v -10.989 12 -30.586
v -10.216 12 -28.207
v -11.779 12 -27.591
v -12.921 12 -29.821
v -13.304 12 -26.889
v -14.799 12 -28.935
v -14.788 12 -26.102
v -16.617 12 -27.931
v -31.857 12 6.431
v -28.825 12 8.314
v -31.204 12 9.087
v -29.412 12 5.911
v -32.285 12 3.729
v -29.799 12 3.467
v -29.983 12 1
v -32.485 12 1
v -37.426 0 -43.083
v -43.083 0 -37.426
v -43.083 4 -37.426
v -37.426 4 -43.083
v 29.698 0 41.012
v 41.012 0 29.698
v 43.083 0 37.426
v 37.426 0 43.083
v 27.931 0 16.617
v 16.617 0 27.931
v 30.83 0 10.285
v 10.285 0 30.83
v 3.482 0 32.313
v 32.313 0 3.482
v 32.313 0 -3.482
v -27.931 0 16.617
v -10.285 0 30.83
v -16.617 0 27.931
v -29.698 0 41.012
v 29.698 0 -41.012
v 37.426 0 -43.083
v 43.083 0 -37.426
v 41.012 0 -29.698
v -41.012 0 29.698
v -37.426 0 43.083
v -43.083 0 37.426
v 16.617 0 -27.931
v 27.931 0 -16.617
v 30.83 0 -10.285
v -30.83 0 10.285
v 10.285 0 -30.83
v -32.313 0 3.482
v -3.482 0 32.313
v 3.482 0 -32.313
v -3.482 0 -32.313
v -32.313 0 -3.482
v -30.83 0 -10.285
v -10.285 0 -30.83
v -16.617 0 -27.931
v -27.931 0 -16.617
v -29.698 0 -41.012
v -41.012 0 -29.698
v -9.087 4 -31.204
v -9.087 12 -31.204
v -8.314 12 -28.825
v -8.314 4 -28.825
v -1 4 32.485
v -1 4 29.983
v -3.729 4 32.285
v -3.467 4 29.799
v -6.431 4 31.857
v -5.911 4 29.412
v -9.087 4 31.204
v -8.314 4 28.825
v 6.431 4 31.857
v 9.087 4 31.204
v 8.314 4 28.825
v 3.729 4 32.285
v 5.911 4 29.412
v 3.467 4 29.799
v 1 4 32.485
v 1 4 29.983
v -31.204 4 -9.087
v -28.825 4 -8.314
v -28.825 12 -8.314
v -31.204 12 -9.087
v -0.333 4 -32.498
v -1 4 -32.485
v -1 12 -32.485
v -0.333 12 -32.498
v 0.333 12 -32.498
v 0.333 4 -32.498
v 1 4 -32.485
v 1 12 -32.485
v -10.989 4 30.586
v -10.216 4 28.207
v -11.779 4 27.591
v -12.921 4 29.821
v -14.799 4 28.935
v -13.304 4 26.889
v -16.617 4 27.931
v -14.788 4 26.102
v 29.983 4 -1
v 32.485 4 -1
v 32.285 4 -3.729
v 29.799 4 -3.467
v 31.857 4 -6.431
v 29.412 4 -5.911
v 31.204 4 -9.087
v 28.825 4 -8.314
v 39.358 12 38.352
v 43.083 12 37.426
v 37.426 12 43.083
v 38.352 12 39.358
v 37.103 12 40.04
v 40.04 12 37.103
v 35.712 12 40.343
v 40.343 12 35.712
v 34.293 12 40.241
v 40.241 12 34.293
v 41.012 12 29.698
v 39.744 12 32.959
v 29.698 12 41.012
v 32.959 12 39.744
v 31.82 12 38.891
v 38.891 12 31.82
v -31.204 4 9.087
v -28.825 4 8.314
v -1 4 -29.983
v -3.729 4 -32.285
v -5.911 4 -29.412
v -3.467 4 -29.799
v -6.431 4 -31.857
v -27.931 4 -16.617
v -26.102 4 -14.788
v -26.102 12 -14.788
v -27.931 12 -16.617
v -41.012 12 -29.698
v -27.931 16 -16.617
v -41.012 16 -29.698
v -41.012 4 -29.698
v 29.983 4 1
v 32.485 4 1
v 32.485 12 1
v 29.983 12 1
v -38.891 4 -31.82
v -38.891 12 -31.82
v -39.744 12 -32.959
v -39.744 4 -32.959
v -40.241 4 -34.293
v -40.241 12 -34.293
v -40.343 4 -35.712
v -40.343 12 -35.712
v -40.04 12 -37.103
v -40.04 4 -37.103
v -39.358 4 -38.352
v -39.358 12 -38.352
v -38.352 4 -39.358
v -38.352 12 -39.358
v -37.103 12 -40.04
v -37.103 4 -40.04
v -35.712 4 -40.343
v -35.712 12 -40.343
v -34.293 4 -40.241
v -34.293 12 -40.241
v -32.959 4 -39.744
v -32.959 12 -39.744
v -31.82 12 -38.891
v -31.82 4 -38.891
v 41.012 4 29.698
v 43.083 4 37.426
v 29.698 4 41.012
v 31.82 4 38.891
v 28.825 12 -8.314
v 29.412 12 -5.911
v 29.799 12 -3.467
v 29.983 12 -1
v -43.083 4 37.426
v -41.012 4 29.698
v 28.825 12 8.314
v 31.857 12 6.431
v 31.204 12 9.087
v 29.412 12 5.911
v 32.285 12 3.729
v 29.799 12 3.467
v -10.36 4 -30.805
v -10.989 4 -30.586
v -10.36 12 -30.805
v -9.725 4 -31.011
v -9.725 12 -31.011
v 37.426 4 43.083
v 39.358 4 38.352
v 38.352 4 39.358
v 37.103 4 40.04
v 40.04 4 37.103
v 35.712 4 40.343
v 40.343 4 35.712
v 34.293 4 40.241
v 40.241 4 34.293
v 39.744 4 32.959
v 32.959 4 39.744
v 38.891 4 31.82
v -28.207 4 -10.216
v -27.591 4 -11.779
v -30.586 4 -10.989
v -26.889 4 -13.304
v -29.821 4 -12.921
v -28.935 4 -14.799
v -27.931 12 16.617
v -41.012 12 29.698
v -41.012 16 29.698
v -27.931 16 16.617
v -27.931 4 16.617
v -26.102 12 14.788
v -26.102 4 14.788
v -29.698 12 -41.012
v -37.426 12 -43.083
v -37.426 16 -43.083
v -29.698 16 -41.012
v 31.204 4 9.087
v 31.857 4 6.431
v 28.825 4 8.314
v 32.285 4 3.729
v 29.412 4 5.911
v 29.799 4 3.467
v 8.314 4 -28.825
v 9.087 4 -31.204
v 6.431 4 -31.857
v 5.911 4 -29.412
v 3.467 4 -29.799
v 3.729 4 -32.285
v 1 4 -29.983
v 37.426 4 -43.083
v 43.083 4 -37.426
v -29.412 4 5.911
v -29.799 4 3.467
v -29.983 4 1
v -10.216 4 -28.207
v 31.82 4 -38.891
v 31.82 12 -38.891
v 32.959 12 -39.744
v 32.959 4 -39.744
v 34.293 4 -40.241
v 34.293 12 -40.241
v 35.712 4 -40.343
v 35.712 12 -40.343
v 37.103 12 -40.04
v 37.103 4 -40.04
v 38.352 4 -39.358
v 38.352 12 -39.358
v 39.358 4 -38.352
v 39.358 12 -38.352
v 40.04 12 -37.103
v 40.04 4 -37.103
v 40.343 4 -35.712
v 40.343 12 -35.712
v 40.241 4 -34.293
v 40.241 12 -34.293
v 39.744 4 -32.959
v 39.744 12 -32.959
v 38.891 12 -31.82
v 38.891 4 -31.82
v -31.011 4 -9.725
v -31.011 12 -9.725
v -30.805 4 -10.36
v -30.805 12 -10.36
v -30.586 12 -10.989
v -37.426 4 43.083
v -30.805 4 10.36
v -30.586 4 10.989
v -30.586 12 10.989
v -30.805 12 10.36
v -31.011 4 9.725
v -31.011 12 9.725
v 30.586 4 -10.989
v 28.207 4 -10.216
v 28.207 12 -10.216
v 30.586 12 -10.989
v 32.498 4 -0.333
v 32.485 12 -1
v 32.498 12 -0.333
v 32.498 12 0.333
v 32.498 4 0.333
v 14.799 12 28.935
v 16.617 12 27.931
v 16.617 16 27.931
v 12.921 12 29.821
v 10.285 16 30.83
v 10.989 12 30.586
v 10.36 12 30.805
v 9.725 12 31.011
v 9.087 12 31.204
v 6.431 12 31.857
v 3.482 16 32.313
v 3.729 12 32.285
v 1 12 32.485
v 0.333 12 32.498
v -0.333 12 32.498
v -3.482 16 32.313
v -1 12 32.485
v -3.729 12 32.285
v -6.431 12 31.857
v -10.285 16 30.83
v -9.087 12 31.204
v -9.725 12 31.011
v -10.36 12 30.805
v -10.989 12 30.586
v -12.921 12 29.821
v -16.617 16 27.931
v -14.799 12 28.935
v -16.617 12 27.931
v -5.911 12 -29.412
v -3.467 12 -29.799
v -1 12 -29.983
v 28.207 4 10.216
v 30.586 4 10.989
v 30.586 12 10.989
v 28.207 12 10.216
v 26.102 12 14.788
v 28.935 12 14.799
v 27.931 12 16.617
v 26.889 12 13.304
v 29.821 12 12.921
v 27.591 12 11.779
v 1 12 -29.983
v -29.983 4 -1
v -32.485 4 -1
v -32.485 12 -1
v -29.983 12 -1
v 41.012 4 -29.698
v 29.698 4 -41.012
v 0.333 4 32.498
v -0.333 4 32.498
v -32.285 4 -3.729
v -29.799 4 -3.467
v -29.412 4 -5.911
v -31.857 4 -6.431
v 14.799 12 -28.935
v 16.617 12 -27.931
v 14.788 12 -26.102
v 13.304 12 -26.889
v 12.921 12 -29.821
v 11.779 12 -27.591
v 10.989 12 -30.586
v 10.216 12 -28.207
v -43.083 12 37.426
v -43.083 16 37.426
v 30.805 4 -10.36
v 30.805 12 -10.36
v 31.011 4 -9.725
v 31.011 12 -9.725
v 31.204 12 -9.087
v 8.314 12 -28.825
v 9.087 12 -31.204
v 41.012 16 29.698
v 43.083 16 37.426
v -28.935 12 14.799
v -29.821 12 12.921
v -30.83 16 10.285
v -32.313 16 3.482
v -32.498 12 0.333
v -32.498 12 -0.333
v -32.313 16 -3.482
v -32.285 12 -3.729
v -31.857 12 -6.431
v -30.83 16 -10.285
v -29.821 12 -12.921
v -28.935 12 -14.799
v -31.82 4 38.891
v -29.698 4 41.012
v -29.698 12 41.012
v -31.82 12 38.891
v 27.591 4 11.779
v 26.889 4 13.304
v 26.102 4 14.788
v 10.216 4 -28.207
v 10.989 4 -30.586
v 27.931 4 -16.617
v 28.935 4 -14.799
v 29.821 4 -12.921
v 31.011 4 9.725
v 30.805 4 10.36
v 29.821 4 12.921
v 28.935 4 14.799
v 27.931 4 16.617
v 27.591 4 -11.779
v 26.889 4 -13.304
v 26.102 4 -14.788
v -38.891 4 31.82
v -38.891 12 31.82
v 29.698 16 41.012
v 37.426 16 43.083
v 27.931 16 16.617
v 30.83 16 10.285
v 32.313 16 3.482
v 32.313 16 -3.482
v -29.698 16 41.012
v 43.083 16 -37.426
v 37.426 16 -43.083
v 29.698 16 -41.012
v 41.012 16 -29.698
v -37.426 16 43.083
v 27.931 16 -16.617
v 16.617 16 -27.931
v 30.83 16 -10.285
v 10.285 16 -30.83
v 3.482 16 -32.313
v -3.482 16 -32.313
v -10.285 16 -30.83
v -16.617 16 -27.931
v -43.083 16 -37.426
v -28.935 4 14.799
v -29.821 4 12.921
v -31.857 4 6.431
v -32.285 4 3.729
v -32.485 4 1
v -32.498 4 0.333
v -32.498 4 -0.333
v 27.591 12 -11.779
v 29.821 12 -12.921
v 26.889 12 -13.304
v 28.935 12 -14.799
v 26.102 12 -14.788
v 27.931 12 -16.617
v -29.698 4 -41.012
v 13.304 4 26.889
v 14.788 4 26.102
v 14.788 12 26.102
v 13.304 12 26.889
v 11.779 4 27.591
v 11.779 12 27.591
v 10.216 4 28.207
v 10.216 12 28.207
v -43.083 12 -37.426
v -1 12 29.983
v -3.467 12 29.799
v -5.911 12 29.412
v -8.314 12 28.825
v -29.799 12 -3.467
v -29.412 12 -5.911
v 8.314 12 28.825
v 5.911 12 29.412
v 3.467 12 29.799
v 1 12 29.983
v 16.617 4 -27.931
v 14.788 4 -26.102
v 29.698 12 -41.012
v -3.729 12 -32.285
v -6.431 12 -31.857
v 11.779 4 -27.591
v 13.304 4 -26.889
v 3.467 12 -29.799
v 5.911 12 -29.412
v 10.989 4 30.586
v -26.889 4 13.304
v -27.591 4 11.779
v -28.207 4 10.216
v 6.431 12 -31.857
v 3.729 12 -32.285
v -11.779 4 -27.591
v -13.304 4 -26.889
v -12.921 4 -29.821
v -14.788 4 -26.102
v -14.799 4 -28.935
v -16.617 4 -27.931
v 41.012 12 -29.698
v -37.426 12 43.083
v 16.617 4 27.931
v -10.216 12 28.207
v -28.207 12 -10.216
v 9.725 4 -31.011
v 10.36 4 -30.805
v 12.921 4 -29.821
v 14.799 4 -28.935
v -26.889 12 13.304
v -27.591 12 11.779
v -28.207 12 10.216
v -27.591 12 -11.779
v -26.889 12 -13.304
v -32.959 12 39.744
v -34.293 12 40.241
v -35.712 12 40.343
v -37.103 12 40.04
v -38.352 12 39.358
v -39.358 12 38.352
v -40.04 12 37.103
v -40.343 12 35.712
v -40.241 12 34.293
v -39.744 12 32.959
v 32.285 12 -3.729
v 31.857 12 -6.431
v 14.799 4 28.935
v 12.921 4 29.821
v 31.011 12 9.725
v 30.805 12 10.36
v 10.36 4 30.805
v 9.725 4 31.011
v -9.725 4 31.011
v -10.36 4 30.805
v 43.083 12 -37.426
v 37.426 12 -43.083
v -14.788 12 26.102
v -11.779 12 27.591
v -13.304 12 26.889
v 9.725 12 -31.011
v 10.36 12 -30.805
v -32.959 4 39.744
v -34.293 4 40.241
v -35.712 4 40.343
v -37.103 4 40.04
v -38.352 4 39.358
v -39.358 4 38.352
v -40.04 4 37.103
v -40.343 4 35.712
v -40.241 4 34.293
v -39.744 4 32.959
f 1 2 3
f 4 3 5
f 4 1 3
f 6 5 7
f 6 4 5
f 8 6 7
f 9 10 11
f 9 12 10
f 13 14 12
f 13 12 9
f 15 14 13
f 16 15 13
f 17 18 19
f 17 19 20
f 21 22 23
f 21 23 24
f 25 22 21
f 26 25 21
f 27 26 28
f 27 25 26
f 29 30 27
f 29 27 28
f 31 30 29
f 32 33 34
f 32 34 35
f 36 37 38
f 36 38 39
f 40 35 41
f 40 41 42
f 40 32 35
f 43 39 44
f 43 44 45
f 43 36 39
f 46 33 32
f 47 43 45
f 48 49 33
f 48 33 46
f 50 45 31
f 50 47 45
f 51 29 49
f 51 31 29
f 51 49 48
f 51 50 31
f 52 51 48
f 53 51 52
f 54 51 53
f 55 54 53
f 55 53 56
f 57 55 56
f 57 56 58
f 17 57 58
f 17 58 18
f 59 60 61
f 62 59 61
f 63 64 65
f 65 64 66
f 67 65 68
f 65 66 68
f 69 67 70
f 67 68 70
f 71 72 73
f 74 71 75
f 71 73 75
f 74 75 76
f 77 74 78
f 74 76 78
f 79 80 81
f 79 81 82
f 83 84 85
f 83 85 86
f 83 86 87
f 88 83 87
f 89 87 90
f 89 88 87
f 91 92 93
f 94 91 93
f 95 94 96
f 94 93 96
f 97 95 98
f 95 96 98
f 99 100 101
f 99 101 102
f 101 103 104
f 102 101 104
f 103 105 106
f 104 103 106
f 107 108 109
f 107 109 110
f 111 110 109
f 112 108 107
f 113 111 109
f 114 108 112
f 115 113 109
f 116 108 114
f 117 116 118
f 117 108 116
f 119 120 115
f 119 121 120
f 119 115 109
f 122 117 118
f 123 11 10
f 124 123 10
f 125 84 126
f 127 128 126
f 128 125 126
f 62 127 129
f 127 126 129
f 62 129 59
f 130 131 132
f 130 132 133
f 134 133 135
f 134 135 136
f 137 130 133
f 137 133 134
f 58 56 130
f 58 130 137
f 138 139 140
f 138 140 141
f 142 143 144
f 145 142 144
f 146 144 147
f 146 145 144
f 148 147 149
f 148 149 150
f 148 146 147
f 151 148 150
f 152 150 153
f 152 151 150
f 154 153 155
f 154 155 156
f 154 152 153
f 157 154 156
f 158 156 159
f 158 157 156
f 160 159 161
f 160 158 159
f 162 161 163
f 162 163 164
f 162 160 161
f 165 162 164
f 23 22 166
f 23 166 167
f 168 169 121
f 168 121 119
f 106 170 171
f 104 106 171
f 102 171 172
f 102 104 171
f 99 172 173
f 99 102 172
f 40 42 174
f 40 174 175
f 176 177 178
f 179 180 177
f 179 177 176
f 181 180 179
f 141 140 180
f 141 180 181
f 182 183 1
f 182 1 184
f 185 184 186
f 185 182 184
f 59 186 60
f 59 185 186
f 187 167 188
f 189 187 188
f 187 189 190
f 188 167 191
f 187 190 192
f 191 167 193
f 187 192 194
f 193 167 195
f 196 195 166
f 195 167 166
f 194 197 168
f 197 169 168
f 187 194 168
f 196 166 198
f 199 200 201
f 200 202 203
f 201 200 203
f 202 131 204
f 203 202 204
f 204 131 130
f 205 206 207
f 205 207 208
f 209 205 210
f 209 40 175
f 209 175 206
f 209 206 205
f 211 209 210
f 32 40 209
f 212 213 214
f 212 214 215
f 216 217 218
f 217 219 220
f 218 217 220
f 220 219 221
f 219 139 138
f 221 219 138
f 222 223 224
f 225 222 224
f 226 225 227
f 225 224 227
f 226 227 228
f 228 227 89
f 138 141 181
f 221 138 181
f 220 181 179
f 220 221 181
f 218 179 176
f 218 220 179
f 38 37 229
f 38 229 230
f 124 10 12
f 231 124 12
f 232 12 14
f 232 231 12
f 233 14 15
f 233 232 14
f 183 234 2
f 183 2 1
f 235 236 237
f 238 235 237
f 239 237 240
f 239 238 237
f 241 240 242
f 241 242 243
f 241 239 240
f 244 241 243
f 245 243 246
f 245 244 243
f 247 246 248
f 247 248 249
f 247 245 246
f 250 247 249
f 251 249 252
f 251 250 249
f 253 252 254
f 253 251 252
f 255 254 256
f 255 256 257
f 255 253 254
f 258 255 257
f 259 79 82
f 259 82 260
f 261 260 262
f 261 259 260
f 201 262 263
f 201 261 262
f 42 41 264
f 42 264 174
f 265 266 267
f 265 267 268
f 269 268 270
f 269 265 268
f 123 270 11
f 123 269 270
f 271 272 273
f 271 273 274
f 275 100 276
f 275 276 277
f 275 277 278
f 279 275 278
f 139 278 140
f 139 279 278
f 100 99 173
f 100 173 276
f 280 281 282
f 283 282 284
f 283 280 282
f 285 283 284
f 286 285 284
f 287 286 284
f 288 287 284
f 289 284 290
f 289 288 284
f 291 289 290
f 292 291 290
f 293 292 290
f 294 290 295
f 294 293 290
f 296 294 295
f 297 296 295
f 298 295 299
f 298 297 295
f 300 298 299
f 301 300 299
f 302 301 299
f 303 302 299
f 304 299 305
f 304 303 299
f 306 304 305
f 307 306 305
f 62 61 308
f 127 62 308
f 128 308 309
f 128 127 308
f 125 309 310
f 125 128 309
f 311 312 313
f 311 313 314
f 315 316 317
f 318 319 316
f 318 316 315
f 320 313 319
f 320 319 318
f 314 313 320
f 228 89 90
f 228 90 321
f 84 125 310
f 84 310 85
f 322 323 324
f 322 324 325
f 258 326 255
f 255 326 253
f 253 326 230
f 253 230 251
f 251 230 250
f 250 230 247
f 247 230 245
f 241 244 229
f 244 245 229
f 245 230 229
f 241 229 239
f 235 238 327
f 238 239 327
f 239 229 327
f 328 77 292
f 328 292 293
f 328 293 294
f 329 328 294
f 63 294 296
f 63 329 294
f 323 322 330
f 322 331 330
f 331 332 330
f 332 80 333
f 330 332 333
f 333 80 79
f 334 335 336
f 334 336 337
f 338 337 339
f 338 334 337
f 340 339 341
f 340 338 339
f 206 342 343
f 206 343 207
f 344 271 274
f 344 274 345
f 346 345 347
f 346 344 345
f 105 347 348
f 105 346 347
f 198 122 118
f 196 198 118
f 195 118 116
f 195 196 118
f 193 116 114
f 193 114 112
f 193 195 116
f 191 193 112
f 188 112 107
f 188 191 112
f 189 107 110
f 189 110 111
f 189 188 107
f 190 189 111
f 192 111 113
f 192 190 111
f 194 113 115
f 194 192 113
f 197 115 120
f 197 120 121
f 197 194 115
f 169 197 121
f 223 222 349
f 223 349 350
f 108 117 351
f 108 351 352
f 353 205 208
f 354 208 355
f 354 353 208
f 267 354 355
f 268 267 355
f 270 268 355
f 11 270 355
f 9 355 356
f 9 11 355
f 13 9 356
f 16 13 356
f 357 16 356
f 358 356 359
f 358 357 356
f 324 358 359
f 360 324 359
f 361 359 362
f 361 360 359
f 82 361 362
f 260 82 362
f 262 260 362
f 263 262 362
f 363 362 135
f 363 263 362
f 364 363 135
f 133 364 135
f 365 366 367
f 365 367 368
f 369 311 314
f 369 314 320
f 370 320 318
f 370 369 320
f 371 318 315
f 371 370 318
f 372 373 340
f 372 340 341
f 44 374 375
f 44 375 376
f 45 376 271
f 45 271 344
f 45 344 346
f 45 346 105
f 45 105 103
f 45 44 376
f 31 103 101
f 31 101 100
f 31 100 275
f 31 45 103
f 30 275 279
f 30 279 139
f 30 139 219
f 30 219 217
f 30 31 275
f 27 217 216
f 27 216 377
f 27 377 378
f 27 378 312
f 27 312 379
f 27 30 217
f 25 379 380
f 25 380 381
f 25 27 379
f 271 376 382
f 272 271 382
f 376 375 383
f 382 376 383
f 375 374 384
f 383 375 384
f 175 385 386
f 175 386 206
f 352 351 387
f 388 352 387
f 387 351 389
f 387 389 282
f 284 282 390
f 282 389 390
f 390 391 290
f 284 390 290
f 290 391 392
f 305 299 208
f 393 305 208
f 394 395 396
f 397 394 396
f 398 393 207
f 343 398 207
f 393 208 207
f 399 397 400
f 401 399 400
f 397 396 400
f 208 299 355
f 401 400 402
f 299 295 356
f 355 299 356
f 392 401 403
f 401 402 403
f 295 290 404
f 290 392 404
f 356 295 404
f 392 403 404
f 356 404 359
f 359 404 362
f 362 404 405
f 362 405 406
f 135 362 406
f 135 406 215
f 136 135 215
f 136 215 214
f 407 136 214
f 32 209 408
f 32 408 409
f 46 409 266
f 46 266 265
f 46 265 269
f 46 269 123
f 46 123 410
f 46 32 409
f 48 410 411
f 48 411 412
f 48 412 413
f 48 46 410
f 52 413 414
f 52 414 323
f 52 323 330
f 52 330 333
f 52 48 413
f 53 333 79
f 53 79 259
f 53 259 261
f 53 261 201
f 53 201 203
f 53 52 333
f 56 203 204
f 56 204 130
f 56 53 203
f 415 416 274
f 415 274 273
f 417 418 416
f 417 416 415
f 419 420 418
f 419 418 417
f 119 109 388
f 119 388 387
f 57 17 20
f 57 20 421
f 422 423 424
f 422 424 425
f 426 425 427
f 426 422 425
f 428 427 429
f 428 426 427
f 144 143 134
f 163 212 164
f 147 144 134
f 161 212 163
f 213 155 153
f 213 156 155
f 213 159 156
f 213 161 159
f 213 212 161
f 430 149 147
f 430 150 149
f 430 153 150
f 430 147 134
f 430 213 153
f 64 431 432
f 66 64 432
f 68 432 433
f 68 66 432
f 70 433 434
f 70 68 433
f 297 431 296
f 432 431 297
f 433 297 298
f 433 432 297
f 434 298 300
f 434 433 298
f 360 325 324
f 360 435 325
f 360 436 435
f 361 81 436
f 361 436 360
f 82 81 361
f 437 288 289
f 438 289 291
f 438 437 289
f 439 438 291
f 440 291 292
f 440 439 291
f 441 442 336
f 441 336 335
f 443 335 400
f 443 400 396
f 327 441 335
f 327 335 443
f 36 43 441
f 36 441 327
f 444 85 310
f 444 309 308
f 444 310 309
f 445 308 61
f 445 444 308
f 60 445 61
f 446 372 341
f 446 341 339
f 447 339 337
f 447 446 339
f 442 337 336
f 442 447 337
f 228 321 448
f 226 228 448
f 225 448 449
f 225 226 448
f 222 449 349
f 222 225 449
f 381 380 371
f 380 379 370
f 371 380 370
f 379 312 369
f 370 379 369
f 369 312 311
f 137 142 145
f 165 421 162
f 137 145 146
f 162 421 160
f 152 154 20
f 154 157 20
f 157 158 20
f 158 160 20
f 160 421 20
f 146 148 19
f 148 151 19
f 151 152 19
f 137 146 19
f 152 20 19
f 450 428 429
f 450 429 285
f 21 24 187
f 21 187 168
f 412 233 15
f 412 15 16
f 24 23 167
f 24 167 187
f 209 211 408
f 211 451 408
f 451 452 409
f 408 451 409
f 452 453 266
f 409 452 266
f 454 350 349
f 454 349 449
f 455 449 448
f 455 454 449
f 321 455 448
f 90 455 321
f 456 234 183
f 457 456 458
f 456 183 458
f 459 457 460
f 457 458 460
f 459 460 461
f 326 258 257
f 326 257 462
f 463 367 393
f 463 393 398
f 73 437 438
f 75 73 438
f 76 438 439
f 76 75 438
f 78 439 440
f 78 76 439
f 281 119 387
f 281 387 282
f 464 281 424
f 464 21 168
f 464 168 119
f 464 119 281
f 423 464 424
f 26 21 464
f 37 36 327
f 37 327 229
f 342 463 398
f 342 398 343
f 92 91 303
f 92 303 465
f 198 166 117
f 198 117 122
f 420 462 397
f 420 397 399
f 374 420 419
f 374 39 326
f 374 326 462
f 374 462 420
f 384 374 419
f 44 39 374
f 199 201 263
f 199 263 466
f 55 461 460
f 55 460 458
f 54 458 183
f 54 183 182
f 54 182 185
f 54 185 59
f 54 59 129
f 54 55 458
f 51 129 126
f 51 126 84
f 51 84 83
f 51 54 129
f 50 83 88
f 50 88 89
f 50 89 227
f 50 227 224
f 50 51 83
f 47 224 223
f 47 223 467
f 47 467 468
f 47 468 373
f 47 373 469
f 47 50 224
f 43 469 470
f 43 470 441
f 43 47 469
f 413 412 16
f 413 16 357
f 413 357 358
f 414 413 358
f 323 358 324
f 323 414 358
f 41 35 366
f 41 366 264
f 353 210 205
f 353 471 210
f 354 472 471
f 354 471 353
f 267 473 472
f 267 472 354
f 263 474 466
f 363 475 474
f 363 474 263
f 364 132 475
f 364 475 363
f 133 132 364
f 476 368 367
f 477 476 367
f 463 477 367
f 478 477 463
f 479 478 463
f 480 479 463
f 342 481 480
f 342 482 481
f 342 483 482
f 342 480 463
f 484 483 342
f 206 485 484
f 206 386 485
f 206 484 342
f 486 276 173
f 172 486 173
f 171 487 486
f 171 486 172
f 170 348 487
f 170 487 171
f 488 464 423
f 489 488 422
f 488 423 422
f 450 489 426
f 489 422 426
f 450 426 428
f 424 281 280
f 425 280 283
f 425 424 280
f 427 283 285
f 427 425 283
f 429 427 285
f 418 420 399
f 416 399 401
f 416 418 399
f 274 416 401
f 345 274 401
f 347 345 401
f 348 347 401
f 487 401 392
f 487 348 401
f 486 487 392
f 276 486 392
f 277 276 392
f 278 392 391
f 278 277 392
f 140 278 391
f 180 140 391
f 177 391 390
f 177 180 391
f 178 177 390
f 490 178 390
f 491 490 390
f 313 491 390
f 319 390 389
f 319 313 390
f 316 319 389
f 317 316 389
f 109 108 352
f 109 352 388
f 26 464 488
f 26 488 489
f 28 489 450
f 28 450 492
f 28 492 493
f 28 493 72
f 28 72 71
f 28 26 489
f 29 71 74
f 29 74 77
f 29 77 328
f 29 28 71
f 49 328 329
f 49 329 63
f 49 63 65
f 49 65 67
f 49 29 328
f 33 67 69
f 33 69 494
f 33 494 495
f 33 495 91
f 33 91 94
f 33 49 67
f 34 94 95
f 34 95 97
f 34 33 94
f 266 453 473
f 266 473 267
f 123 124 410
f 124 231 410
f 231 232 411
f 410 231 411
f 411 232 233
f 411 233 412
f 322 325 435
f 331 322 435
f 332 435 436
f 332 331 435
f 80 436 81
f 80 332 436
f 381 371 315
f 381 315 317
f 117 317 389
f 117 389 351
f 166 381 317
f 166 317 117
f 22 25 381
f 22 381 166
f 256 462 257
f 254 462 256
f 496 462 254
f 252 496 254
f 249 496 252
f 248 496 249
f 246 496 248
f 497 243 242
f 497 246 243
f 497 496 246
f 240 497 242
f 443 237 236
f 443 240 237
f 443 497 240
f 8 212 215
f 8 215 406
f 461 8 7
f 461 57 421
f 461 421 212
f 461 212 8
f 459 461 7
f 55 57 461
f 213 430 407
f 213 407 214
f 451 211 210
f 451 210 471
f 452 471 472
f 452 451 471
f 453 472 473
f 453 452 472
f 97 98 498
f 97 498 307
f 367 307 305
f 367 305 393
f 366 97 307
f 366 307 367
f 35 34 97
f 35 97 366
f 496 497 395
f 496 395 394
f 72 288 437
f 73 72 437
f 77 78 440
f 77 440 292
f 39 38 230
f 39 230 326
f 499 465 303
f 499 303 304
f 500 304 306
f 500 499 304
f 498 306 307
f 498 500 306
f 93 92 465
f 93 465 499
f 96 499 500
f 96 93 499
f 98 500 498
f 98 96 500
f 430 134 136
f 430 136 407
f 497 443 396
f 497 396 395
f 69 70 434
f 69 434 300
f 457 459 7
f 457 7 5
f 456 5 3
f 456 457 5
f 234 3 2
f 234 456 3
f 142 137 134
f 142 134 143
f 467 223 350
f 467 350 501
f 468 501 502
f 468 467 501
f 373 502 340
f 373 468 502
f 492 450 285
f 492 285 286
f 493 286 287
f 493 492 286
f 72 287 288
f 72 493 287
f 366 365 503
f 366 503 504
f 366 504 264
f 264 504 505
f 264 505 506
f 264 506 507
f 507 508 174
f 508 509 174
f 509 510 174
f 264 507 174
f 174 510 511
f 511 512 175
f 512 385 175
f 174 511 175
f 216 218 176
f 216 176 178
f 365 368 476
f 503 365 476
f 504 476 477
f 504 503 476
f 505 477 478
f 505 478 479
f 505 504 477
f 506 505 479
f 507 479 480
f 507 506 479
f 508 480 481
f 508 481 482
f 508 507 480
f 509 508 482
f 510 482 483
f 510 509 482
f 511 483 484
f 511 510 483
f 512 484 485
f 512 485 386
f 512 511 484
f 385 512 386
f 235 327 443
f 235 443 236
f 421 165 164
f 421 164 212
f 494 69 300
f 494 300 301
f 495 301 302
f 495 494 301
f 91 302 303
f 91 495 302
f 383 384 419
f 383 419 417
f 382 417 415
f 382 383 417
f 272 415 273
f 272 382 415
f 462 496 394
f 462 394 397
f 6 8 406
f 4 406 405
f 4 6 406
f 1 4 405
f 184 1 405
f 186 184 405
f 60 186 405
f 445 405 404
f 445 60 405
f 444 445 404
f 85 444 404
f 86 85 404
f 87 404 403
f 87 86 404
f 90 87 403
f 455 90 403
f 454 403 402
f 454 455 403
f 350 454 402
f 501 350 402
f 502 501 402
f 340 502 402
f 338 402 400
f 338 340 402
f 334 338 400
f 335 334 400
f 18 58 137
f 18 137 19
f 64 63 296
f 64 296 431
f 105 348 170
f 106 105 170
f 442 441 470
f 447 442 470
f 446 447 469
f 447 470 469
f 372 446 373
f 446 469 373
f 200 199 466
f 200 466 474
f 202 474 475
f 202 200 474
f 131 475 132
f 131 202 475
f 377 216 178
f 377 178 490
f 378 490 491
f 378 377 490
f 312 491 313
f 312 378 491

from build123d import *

# Parameters (mm, degrees)
BOSS_EXTRUDE8_DEPTH  = 4
BOSS_EXTRUDE10_DEPTH = 8
BOSS_EXTRUDE11_DEPTH = 4


with BuildPart() as part:
    # Sketch11 → Boss-Extrude8 (new body)
    with BuildSketch(Plane(origin=(0, 0, 0), x_dir=(1, 0, 0), z_dir=(0, 1, 0))):
        with BuildLine():
            Line((27.930717857, -16.617009358), (41.012193309, -29.69848481))
            Line((41.012193309, -29.69848481), (43.08274567, -37.42589142))
            Line((43.08274567, -37.42589142), (37.42589142, -43.08274567))
            Line((37.42589142, -43.08274567), (29.69848481, -41.012193309))
            Line((29.69848481, -41.012193309), (16.617009358, -27.930717857))
            ThreePointArc((16.617009358, -27.930717857), (0, -32.5), (-16.617009358, -27.930717857))
            Line((-16.617009358, -27.930717857), (-29.69848481, -41.012193309))
            Line((-29.69848481, -41.012193309), (-37.42589142, -43.08274567))
            Line((-37.42589142, -43.08274567), (-43.08274567, -37.42589142))
            Line((-43.08274567, -37.42589142), (-41.012193309, -29.69848481))
            Line((-41.012193309, -29.69848481), (-27.930717857, -16.617009358))
            ThreePointArc((-27.930717857, -16.617009358), (-32.5, 0), (-27.930717857, 16.617009358))
            Line((-27.930717857, 16.617009358), (-41.012193309, 29.69848481))
            Line((-41.012193309, 29.69848481), (-43.08274567, 37.42589142))
            Line((-43.08274567, 37.42589142), (-37.42589142, 43.08274567))
            Line((-37.42589142, 43.08274567), (-29.69848481, 41.012193309))
            Line((-29.69848481, 41.012193309), (-16.617009358, 27.930717857))
            ThreePointArc((-16.617009358, 27.930717857), (0, 32.5), (16.617009358, 27.930717857))
            Line((16.617009358, 27.930717857), (29.69848481, 41.012193309))
            Line((29.69848481, 41.012193309), (37.42589142, 43.08274567))
            Line((37.42589142, 43.08274567), (43.08274567, 37.42589142))
            Line((43.08274567, 37.42589142), (41.012193309, 29.69848481))
            Line((41.012193309, 29.69848481), (27.930717857, 16.617009358))
            ThreePointArc((27.930717857, 16.617009358), (32.5, 0), (27.930717857, -16.617009358))
        make_face()
    extrude(amount=BOSS_EXTRUDE8_DEPTH)

    # Sketch12 → Boss-Extrude10 (add)
    with BuildSketch(Plane(origin=(0, 4, 0), x_dir=(1, 0, 0), z_dir=(0, 1, 0))):
        with BuildLine():
            Line((38.890872967, 31.819805152), (41.012193309, 29.69848481))
            Line((41.012193309, 29.69848481), (26.10190255, 14.788194051))
            ThreePointArc((26.10190255, 14.788194051), (27.250407583, 12.546524879), (28.206823147, 10.216414633))
            Line((28.206823147, 10.216414633), (30.585684682, 10.9893536))
            ThreePointArc((30.585684682, 10.9893536), (30.90933678, 10.043052317), (31.203718671, 9.087240568))
            Line((31.203718671, 9.087240568), (28.824857136, 8.3143016))
            ThreePointArc((28.824857136, 8.3143016), (29.630650218, 4.693033951), (29.983328701, 1))
            Line((29.983328701, 1), (32.484611742, 1))
            ThreePointArc((32.484611742, 1), (32.5, 0), (32.484611742, -1))
            Line((32.484611742, -1), (29.983328701, -1))
            ThreePointArc((29.983328701, -1), (29.630650218, -4.693033951), (28.824857136, -8.3143016))
            Line((28.824857136, -8.3143016), (31.203718671, -9.087240568))
            ThreePointArc((31.203718671, -9.087240568), (30.90933678, -10.043052317), (30.585684682, -10.9893536))
            Line((30.585684682, -10.9893536), (28.206823147, -10.216414633))
            ThreePointArc((28.206823147, -10.216414633), (27.250407583, -12.546524879), (26.10190255, -14.788194051))
            Line((26.10190255, -14.788194051), (41.012193309, -29.69848481))
            Line((41.012193309, -29.69848481), (38.890872965, -31.819805153))
            ThreePointArc((38.890872965, -31.819805153), (38.890872965, -38.890872967), (31.819805152, -38.890872967))
            Line((31.819805152, -38.890872967), (29.69848481, -41.012193309))
            Line((29.69848481, -41.012193309), (14.788194051, -26.10190255))
            ThreePointArc((14.788194051, -26.10190255), (12.546524879, -27.250407583), (10.216414633, -28.206823147))
            Line((10.216414633, -28.206823147), (10.9893536, -30.585684682))
            ThreePointArc((10.9893536, -30.585684682), (10.043052317, -30.90933678), (9.087240568, -31.203718671))
            Line((9.087240568, -31.203718671), (8.3143016, -28.824857136))
            ThreePointArc((8.3143016, -28.824857136), (4.693033951, -29.630650218), (1, -29.983328701))
            Line((1, -29.983328701), (1, -32.484611742))
            ThreePointArc((1, -32.484611742), (0, -32.5), (-1, -32.484611742))
            Line((-1, -32.484611742), (-1, -29.983328701))
            ThreePointArc((-1, -29.983328701), (-4.693033951, -29.630650218), (-8.3143016, -28.824857136))
            Line((-8.3143016, -28.824857136), (-9.087240568, -31.203718671))
            ThreePointArc((-9.087240568, -31.203718671), (-10.043052317, -30.90933678), (-10.9893536, -30.585684682))
            Line((-10.9893536, -30.585684682), (-10.216414633, -28.206823147))
            ThreePointArc((-10.216414633, -28.206823147), (-12.546524879, -27.250407583), (-14.788194051, -26.10190255))
            Line((-14.788194051, -26.10190255), (-29.69848481, -41.012193309))
            Line((-29.69848481, -41.012193309), (-31.819805153, -38.890872965))
            ThreePointArc((-31.819805153, -38.890872965), (-38.890872967, -38.890872965), (-38.890872967, -31.819805152))
            Line((-38.890872967, -31.819805152), (-41.012193309, -29.69848481))
            Line((-41.012193309, -29.69848481), (-26.10190255, -14.788194051))
            ThreePointArc((-26.10190255, -14.788194051), (-27.250407583, -12.546524879), (-28.206823147, -10.216414633))
            Line((-28.206823147, -10.216414633), (-30.585684682, -10.9893536))
            ThreePointArc((-30.585684682, -10.9893536), (-30.90933678, -10.043052317), (-31.203718671, -9.087240568))
            Line((-31.203718671, -9.087240568), (-28.824857136, -8.3143016))
            ThreePointArc((-28.824857136, -8.3143016), (-29.630650218, -4.693033951), (-29.983328701, -1))
            Line((-29.983328701, -1), (-32.484611742, -1))
            ThreePointArc((-32.484611742, -1), (-32.5, 0), (-32.484611742, 1))
            Line((-32.484611742, 1), (-29.983328701, 1))
            ThreePointArc((-29.983328701, 1), (-29.630650218, 4.693033951), (-28.824857136, 8.3143016))
            Line((-28.824857136, 8.3143016), (-31.203718671, 9.087240568))
            ThreePointArc((-31.203718671, 9.087240568), (-30.90933678, 10.043052317), (-30.585684682, 10.9893536))
            Line((-30.585684682, 10.9893536), (-28.206823147, 10.216414633))
            ThreePointArc((-28.206823147, 10.216414633), (-27.250407583, 12.546524879), (-26.10190255, 14.788194051))
            Line((-26.10190255, 14.788194051), (-41.012193309, 29.69848481))
            Line((-41.012193309, 29.69848481), (-38.890872965, 31.819805153))
            ThreePointArc((-38.890872965, 31.819805153), (-38.890872965, 38.890872967), (-31.819805152, 38.890872967))
            Line((-31.819805152, 38.890872967), (-29.69848481, 41.012193309))
            Line((-29.69848481, 41.012193309), (-14.788194051, 26.10190255))
            ThreePointArc((-14.788194051, 26.10190255), (-12.546524879, 27.250407583), (-10.216414633, 28.206823147))
            Line((-10.216414633, 28.206823147), (-10.9893536, 30.585684682))
            ThreePointArc((-10.9893536, 30.585684682), (-10.043052317, 30.90933678), (-9.087240568, 31.203718671))
            Line((-9.087240568, 31.203718671), (-8.3143016, 28.824857136))
            ThreePointArc((-8.3143016, 28.824857136), (-4.693033951, 29.630650218), (-1, 29.983328701))
            Line((-1, 29.983328701), (-1, 32.484611742))
            ThreePointArc((-1, 32.484611742), (0, 32.5), (1, 32.484611742))
            Line((1, 32.484611742), (1, 29.983328701))
            ThreePointArc((1, 29.983328701), (4.693033951, 29.630650218), (8.3143016, 28.824857136))
            Line((8.3143016, 28.824857136), (9.087240568, 31.203718671))
            ThreePointArc((9.087240568, 31.203718671), (10.043052317, 30.90933678), (10.9893536, 30.585684682))
            Line((10.9893536, 30.585684682), (10.216414633, 28.206823147))
            ThreePointArc((10.216414633, 28.206823147), (12.546524879, 27.250407583), (14.788194051, 26.10190255))
            Line((14.788194051, 26.10190255), (29.69848481, 41.012193309))
            Line((29.69848481, 41.012193309), (31.819805153, 38.890872965))
            ThreePointArc((31.819805153, 38.890872965), (38.890872967, 38.890872965), (38.890872967, 31.819805152))
        make_face()
    extrude(amount=BOSS_EXTRUDE10_DEPTH)

    # Sketch13 → Boss-Extrude11 (add)
    with BuildSketch(Plane(origin=(0, 12, 0), x_dir=(1, 0, 0), z_dir=(0, 1, 0))):
        with BuildLine():
            Line((27.930717857, -16.617009358), (41.012193309, -29.69848481))
            Line((41.012193309, -29.69848481), (43.08274567, -37.42589142))
            Line((43.08274567, -37.42589142), (37.42589142, -43.08274567))
            Line((37.42589142, -43.08274567), (29.69848481, -41.012193309))
            Line((29.69848481, -41.012193309), (16.617009358, -27.930717857))
            ThreePointArc((16.617009358, -27.930717857), (0, -32.5), (-16.617009358, -27.930717857))
            Line((-16.617009358, -27.930717857), (-29.69848481, -41.012193309))
            Line((-29.69848481, -41.012193309), (-37.42589142, -43.08274567))
            Line((-37.42589142, -43.08274567), (-43.08274567, -37.42589142))
            Line((-43.08274567, -37.42589142), (-41.012193309, -29.69848481))
            Line((-41.012193309, -29.69848481), (-27.930717857, -16.617009358))
            ThreePointArc((-27.930717857, -16.617009358), (-32.5, 0), (-27.930717857, 16.617009358))
            Line((-27.930717857, 16.617009358), (-41.012193309, 29.69848481))
            Line((-41.012193309, 29.69848481), (-43.08274567, 37.42589142))
            Line((-43.08274567, 37.42589142), (-37.42589142, 43.08274567))
            Line((-37.42589142, 43.08274567), (-29.69848481, 41.012193309))
            Line((-29.69848481, 41.012193309), (-16.617009358, 27.930717857))
            ThreePointArc((-16.617009358, 27.930717857), (0, 32.5), (16.617009358, 27.930717857))
            Line((16.617009358, 27.930717857), (29.69848481, 41.012193309))
            Line((29.69848481, 41.012193309), (37.42589142, 43.08274567))
            Line((37.42589142, 43.08274567), (43.08274567, 37.42589142))
            Line((43.08274567, 37.42589142), (41.012193309, 29.69848481))
            Line((41.012193309, 29.69848481), (27.930717857, 16.617009358))
            ThreePointArc((27.930717857, 16.617009358), (32.5, 0), (27.930717857, -16.617009358))
        make_face()
    extrude(amount=BOSS_EXTRUDE11_DEPTH)


solid = part.part
